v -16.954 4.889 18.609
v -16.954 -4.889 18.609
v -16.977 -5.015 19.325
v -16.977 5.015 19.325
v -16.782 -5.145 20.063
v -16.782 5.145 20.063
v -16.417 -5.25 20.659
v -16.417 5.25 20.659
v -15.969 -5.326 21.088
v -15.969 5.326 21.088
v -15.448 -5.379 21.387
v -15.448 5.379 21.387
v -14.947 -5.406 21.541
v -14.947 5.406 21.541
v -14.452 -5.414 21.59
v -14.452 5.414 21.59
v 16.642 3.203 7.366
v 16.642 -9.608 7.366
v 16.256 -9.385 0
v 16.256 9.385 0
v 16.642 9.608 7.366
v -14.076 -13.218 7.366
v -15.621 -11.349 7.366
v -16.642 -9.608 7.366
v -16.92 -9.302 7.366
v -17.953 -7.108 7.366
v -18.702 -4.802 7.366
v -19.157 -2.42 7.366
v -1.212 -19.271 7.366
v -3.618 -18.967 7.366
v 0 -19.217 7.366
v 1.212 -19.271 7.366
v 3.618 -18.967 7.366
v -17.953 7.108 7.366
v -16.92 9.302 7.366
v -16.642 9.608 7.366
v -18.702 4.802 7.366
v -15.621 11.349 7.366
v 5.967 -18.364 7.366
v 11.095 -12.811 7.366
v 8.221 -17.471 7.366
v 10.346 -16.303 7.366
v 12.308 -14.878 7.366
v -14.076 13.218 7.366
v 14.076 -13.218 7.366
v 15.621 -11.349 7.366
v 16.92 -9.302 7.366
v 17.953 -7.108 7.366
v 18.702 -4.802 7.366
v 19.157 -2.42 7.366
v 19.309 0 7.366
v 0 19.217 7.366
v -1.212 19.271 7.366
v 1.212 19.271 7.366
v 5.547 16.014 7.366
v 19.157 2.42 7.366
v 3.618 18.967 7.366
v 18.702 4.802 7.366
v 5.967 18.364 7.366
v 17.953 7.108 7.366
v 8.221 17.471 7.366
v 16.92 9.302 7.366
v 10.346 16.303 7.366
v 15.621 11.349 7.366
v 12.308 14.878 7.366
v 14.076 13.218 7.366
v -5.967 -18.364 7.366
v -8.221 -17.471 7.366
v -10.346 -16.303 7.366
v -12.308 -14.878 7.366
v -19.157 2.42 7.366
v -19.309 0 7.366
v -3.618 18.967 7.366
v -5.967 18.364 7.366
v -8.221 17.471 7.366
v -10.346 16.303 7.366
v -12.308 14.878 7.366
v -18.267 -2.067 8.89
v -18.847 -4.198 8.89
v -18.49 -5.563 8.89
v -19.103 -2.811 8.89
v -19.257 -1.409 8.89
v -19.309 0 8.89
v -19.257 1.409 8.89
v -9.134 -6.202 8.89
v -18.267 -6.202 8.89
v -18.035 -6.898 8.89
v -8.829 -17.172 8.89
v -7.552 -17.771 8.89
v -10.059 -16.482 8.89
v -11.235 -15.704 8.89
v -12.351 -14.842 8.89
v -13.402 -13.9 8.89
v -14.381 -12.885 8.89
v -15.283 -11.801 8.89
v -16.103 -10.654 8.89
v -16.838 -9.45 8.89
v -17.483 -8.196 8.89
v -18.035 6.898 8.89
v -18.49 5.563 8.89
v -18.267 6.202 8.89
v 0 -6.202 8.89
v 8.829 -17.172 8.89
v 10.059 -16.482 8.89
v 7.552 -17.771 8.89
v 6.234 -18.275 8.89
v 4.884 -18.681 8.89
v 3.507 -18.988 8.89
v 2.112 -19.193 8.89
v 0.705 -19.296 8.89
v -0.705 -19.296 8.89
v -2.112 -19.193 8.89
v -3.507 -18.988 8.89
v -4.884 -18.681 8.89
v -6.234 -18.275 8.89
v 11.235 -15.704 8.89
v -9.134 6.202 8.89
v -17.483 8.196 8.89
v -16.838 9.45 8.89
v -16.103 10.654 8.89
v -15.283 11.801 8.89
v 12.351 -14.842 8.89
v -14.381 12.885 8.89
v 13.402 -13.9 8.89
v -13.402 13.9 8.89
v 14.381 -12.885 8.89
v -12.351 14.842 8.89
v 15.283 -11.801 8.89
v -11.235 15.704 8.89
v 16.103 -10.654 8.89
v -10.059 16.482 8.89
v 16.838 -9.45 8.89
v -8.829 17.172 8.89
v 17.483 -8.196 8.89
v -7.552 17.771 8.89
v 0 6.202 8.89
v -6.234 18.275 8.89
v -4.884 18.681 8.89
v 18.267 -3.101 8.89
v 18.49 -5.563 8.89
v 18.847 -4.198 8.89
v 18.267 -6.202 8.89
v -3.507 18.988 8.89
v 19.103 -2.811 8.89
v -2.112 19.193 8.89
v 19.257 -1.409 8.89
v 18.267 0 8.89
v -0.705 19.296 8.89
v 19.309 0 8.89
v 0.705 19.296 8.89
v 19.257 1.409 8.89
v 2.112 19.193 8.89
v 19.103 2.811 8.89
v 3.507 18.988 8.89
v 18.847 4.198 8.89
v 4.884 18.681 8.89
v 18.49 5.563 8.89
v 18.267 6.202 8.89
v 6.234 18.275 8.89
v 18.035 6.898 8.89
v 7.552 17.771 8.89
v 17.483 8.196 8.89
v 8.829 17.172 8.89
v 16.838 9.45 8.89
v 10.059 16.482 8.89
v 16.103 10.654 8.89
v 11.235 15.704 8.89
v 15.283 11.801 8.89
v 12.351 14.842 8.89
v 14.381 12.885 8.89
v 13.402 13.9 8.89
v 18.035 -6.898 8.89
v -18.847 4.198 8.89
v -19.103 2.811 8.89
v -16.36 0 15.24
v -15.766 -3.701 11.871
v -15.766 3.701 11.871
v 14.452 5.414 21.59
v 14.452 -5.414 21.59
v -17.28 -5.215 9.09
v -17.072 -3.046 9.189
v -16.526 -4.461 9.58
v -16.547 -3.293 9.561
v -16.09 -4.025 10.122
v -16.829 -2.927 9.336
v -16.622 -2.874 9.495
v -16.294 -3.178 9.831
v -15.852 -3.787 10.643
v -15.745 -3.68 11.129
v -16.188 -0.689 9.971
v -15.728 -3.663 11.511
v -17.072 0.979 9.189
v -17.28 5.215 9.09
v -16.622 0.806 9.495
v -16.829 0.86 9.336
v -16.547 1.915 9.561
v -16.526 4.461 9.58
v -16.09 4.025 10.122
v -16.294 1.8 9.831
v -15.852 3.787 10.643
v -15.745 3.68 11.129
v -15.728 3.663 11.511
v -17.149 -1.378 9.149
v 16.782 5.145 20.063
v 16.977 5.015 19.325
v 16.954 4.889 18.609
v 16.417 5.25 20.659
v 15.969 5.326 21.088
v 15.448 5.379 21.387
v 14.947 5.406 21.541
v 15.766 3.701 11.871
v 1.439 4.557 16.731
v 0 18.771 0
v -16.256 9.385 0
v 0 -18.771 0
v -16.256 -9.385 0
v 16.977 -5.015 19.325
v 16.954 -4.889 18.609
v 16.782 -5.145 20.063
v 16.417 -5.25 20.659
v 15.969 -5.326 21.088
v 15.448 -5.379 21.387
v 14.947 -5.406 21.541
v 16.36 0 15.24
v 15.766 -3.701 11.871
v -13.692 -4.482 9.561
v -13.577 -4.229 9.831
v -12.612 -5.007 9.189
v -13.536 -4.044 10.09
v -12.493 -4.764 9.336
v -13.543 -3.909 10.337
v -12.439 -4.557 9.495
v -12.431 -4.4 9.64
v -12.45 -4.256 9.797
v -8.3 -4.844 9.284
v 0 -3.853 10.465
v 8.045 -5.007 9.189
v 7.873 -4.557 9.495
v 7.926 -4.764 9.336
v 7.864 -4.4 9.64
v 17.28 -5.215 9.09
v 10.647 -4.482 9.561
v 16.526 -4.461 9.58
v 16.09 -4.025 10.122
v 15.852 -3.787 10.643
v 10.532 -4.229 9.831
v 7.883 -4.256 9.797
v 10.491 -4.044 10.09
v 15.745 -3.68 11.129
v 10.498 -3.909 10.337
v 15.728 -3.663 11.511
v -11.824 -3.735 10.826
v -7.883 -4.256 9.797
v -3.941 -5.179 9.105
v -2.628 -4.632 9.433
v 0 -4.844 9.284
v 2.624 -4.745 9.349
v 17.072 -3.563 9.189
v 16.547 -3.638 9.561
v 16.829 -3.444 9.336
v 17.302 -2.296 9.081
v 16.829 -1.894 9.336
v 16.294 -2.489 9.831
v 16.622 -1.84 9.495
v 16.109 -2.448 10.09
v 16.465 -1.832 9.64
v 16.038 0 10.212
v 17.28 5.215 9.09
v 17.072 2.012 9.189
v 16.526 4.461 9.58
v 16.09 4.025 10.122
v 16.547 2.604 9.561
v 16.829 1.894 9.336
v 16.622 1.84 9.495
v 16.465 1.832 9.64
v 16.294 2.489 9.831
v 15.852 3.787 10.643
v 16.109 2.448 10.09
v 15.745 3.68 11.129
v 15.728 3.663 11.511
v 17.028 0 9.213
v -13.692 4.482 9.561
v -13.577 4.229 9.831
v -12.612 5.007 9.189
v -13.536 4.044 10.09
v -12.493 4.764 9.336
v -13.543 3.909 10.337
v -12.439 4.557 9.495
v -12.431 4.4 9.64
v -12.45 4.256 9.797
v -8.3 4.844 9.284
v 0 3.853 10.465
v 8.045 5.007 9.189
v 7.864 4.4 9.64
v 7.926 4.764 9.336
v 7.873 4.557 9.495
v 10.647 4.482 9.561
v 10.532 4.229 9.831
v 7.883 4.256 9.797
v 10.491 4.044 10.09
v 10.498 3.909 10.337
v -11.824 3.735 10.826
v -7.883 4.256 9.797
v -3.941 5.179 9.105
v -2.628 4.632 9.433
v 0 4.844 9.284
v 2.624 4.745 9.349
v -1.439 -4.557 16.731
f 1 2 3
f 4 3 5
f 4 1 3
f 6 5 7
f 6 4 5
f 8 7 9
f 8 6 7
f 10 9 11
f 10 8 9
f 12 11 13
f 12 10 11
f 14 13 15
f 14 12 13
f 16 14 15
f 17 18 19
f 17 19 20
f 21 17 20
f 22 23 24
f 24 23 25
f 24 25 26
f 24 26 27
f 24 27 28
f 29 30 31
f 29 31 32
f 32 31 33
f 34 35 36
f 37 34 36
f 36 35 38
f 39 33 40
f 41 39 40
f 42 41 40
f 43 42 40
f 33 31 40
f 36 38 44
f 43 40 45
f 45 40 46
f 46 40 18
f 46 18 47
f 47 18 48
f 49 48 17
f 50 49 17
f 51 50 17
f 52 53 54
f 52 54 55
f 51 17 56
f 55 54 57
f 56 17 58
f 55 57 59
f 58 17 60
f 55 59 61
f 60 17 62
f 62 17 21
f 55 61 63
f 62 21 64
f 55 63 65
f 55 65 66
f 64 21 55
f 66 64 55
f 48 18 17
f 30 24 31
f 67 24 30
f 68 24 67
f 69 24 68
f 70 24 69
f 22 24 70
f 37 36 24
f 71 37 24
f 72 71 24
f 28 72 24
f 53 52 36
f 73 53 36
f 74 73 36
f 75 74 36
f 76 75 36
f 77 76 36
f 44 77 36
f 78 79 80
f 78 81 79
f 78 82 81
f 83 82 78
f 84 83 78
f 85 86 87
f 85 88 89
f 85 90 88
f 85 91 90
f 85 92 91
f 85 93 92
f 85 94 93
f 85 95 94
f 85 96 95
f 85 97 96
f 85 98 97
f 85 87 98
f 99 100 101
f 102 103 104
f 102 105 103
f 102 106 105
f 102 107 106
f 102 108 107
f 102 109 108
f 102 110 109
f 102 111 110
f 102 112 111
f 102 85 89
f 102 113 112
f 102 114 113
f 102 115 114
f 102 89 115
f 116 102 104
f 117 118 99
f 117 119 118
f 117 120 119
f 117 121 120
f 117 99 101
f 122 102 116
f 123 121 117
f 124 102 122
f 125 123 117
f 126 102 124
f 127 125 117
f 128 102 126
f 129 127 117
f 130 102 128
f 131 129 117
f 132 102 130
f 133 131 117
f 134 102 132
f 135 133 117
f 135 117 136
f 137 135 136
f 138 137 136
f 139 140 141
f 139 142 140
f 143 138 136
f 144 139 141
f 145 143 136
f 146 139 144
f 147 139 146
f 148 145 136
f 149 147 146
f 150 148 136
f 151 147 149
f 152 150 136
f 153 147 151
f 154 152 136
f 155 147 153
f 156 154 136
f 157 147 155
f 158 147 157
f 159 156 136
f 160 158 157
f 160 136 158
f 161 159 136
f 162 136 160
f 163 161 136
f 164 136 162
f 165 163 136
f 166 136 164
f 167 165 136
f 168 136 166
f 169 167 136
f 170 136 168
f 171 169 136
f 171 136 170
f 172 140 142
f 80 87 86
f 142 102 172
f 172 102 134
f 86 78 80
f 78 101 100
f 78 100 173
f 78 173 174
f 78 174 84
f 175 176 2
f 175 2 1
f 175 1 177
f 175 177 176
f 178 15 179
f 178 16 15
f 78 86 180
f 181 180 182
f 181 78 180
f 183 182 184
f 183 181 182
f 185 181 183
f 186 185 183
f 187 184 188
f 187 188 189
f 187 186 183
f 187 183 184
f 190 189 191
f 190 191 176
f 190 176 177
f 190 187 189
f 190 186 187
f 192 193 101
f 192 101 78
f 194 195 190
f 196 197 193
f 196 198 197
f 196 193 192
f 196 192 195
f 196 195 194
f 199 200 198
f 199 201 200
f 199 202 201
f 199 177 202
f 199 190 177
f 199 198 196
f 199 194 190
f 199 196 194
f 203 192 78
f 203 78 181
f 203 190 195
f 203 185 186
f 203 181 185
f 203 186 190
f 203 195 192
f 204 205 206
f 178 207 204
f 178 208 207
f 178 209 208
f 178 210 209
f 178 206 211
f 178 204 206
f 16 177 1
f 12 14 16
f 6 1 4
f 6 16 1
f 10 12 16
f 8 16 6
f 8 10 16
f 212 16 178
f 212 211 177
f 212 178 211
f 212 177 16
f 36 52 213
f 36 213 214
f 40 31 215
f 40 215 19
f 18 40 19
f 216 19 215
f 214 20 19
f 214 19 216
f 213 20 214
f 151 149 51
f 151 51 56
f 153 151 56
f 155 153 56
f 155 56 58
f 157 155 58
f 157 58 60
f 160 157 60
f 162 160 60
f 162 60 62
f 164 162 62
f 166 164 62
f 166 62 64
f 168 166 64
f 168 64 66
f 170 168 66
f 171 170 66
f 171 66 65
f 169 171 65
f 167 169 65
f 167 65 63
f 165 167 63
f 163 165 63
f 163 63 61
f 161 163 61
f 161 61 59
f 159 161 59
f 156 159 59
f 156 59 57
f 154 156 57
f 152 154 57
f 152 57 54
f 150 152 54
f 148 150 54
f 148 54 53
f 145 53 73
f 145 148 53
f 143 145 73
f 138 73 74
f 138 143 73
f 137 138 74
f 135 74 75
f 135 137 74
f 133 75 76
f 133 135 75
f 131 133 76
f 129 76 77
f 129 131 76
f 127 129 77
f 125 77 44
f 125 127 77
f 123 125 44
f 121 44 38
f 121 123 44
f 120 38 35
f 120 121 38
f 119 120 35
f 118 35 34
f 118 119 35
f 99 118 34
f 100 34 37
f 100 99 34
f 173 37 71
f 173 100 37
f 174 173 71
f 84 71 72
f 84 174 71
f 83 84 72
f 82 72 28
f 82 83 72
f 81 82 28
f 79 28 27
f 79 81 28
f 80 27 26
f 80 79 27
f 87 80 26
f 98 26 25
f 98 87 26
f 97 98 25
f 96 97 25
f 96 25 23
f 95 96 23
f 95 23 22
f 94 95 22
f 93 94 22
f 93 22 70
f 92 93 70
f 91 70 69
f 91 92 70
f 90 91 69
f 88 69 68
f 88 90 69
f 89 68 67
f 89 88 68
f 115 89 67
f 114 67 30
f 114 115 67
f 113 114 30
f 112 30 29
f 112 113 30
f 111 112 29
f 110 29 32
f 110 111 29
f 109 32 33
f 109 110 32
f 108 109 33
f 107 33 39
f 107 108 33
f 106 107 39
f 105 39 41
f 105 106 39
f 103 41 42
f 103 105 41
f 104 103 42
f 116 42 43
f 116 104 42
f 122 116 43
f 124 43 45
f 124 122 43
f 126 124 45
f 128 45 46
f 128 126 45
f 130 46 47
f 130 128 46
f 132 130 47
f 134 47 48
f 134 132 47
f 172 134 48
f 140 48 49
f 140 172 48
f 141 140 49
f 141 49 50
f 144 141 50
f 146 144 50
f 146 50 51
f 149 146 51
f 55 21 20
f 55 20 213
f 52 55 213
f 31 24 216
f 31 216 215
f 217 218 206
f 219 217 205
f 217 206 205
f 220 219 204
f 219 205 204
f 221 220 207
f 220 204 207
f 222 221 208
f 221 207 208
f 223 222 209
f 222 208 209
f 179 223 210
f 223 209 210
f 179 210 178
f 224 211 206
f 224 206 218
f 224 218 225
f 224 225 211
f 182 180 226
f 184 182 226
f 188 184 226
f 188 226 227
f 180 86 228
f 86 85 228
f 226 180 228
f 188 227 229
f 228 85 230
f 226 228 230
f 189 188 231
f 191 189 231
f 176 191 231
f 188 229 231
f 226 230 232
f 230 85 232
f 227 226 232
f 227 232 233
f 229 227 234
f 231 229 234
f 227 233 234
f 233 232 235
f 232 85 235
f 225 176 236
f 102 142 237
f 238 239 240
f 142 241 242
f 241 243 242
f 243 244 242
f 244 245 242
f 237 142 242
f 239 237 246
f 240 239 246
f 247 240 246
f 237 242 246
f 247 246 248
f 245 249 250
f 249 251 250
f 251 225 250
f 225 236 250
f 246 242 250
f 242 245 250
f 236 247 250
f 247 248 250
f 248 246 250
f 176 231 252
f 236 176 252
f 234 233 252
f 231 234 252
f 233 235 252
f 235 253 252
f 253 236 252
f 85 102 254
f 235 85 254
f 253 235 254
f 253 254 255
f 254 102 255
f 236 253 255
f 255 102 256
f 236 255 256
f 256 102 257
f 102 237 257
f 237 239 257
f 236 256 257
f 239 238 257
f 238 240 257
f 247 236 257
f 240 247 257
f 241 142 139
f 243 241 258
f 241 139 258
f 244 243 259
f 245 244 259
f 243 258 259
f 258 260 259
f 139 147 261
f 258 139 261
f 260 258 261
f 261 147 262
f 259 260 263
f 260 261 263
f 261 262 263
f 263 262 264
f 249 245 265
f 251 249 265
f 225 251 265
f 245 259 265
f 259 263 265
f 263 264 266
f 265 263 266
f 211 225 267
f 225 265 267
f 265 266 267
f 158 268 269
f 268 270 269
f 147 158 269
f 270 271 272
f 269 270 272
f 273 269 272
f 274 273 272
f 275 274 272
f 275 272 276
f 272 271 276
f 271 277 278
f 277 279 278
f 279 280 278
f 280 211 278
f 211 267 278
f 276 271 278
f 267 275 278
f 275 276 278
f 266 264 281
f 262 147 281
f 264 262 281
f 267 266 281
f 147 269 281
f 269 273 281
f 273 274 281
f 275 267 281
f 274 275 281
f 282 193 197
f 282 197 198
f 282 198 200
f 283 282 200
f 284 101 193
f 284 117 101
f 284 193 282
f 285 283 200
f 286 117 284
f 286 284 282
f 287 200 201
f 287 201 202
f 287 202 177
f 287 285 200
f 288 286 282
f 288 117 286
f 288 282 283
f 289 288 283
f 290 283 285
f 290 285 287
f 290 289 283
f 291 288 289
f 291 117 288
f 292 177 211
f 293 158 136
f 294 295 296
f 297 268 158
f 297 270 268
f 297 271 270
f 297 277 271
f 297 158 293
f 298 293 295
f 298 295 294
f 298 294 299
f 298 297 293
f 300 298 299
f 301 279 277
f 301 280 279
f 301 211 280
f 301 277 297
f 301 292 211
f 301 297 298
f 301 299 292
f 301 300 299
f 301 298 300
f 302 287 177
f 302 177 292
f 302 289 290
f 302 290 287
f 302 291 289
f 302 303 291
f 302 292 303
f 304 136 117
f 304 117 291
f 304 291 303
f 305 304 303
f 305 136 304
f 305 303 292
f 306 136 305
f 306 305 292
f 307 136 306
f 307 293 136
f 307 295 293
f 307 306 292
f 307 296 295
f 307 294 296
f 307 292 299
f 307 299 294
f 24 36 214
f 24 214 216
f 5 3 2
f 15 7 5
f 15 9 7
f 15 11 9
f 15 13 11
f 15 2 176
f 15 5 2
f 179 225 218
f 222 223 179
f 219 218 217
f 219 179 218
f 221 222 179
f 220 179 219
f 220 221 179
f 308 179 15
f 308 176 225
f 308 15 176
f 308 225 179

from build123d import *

# Parameters (mm, degrees)
F1_DEPTH = 8.89
F1_TAPER = -3
F2_R     = 19.3087928885
F3_DEPTH = 1.524
F4_W     = 30.48
F4_H     = 6.35
F5_DEPTH = 12.7
F5_TAPER = -10
F6_R     = 2.54


with BuildPart() as f1:
    # F0 (on Top) → F1 (new body)
    with BuildSketch(Plane.XY):
        Polygon((16.256, -9.3854059759), (16.256, 9.3854059759), (0, 18.7708119519), (-16.256, 9.3854059759), (-16.256, -9.3854059759), (0, -18.7708119519), align=None)
    extrude(amount=F1_DEPTH, taper=F1_TAPER)

    # F2 (on face) → F3 (join)
    with BuildSketch(Plane.XY.offset(8.89)):
        Circle(F2_R)
    extrude(amount=-F3_DEPTH)

    # F4 (on face) → F5 (join)
    with BuildSketch(Plane.XY.offset(8.89)):
        Rectangle(F4_W, F4_H)
    extrude(amount=F5_DEPTH, taper=F5_TAPER)

    # F6
    f6_edges = [f1.edges().sort_by_distance(p)[0] for p in [
        (0, 3.175, 8.89),
        (-15.24, 0, 8.89),
        (0, -3.175, 8.89),
        (15.24, 0, 8.89),
        (-17.479353, 0, 21.59),
        (17.479353, 0, 21.59),
    ]]
    fillet(f6_edges, radius=F6_R)


solid = f1.part
